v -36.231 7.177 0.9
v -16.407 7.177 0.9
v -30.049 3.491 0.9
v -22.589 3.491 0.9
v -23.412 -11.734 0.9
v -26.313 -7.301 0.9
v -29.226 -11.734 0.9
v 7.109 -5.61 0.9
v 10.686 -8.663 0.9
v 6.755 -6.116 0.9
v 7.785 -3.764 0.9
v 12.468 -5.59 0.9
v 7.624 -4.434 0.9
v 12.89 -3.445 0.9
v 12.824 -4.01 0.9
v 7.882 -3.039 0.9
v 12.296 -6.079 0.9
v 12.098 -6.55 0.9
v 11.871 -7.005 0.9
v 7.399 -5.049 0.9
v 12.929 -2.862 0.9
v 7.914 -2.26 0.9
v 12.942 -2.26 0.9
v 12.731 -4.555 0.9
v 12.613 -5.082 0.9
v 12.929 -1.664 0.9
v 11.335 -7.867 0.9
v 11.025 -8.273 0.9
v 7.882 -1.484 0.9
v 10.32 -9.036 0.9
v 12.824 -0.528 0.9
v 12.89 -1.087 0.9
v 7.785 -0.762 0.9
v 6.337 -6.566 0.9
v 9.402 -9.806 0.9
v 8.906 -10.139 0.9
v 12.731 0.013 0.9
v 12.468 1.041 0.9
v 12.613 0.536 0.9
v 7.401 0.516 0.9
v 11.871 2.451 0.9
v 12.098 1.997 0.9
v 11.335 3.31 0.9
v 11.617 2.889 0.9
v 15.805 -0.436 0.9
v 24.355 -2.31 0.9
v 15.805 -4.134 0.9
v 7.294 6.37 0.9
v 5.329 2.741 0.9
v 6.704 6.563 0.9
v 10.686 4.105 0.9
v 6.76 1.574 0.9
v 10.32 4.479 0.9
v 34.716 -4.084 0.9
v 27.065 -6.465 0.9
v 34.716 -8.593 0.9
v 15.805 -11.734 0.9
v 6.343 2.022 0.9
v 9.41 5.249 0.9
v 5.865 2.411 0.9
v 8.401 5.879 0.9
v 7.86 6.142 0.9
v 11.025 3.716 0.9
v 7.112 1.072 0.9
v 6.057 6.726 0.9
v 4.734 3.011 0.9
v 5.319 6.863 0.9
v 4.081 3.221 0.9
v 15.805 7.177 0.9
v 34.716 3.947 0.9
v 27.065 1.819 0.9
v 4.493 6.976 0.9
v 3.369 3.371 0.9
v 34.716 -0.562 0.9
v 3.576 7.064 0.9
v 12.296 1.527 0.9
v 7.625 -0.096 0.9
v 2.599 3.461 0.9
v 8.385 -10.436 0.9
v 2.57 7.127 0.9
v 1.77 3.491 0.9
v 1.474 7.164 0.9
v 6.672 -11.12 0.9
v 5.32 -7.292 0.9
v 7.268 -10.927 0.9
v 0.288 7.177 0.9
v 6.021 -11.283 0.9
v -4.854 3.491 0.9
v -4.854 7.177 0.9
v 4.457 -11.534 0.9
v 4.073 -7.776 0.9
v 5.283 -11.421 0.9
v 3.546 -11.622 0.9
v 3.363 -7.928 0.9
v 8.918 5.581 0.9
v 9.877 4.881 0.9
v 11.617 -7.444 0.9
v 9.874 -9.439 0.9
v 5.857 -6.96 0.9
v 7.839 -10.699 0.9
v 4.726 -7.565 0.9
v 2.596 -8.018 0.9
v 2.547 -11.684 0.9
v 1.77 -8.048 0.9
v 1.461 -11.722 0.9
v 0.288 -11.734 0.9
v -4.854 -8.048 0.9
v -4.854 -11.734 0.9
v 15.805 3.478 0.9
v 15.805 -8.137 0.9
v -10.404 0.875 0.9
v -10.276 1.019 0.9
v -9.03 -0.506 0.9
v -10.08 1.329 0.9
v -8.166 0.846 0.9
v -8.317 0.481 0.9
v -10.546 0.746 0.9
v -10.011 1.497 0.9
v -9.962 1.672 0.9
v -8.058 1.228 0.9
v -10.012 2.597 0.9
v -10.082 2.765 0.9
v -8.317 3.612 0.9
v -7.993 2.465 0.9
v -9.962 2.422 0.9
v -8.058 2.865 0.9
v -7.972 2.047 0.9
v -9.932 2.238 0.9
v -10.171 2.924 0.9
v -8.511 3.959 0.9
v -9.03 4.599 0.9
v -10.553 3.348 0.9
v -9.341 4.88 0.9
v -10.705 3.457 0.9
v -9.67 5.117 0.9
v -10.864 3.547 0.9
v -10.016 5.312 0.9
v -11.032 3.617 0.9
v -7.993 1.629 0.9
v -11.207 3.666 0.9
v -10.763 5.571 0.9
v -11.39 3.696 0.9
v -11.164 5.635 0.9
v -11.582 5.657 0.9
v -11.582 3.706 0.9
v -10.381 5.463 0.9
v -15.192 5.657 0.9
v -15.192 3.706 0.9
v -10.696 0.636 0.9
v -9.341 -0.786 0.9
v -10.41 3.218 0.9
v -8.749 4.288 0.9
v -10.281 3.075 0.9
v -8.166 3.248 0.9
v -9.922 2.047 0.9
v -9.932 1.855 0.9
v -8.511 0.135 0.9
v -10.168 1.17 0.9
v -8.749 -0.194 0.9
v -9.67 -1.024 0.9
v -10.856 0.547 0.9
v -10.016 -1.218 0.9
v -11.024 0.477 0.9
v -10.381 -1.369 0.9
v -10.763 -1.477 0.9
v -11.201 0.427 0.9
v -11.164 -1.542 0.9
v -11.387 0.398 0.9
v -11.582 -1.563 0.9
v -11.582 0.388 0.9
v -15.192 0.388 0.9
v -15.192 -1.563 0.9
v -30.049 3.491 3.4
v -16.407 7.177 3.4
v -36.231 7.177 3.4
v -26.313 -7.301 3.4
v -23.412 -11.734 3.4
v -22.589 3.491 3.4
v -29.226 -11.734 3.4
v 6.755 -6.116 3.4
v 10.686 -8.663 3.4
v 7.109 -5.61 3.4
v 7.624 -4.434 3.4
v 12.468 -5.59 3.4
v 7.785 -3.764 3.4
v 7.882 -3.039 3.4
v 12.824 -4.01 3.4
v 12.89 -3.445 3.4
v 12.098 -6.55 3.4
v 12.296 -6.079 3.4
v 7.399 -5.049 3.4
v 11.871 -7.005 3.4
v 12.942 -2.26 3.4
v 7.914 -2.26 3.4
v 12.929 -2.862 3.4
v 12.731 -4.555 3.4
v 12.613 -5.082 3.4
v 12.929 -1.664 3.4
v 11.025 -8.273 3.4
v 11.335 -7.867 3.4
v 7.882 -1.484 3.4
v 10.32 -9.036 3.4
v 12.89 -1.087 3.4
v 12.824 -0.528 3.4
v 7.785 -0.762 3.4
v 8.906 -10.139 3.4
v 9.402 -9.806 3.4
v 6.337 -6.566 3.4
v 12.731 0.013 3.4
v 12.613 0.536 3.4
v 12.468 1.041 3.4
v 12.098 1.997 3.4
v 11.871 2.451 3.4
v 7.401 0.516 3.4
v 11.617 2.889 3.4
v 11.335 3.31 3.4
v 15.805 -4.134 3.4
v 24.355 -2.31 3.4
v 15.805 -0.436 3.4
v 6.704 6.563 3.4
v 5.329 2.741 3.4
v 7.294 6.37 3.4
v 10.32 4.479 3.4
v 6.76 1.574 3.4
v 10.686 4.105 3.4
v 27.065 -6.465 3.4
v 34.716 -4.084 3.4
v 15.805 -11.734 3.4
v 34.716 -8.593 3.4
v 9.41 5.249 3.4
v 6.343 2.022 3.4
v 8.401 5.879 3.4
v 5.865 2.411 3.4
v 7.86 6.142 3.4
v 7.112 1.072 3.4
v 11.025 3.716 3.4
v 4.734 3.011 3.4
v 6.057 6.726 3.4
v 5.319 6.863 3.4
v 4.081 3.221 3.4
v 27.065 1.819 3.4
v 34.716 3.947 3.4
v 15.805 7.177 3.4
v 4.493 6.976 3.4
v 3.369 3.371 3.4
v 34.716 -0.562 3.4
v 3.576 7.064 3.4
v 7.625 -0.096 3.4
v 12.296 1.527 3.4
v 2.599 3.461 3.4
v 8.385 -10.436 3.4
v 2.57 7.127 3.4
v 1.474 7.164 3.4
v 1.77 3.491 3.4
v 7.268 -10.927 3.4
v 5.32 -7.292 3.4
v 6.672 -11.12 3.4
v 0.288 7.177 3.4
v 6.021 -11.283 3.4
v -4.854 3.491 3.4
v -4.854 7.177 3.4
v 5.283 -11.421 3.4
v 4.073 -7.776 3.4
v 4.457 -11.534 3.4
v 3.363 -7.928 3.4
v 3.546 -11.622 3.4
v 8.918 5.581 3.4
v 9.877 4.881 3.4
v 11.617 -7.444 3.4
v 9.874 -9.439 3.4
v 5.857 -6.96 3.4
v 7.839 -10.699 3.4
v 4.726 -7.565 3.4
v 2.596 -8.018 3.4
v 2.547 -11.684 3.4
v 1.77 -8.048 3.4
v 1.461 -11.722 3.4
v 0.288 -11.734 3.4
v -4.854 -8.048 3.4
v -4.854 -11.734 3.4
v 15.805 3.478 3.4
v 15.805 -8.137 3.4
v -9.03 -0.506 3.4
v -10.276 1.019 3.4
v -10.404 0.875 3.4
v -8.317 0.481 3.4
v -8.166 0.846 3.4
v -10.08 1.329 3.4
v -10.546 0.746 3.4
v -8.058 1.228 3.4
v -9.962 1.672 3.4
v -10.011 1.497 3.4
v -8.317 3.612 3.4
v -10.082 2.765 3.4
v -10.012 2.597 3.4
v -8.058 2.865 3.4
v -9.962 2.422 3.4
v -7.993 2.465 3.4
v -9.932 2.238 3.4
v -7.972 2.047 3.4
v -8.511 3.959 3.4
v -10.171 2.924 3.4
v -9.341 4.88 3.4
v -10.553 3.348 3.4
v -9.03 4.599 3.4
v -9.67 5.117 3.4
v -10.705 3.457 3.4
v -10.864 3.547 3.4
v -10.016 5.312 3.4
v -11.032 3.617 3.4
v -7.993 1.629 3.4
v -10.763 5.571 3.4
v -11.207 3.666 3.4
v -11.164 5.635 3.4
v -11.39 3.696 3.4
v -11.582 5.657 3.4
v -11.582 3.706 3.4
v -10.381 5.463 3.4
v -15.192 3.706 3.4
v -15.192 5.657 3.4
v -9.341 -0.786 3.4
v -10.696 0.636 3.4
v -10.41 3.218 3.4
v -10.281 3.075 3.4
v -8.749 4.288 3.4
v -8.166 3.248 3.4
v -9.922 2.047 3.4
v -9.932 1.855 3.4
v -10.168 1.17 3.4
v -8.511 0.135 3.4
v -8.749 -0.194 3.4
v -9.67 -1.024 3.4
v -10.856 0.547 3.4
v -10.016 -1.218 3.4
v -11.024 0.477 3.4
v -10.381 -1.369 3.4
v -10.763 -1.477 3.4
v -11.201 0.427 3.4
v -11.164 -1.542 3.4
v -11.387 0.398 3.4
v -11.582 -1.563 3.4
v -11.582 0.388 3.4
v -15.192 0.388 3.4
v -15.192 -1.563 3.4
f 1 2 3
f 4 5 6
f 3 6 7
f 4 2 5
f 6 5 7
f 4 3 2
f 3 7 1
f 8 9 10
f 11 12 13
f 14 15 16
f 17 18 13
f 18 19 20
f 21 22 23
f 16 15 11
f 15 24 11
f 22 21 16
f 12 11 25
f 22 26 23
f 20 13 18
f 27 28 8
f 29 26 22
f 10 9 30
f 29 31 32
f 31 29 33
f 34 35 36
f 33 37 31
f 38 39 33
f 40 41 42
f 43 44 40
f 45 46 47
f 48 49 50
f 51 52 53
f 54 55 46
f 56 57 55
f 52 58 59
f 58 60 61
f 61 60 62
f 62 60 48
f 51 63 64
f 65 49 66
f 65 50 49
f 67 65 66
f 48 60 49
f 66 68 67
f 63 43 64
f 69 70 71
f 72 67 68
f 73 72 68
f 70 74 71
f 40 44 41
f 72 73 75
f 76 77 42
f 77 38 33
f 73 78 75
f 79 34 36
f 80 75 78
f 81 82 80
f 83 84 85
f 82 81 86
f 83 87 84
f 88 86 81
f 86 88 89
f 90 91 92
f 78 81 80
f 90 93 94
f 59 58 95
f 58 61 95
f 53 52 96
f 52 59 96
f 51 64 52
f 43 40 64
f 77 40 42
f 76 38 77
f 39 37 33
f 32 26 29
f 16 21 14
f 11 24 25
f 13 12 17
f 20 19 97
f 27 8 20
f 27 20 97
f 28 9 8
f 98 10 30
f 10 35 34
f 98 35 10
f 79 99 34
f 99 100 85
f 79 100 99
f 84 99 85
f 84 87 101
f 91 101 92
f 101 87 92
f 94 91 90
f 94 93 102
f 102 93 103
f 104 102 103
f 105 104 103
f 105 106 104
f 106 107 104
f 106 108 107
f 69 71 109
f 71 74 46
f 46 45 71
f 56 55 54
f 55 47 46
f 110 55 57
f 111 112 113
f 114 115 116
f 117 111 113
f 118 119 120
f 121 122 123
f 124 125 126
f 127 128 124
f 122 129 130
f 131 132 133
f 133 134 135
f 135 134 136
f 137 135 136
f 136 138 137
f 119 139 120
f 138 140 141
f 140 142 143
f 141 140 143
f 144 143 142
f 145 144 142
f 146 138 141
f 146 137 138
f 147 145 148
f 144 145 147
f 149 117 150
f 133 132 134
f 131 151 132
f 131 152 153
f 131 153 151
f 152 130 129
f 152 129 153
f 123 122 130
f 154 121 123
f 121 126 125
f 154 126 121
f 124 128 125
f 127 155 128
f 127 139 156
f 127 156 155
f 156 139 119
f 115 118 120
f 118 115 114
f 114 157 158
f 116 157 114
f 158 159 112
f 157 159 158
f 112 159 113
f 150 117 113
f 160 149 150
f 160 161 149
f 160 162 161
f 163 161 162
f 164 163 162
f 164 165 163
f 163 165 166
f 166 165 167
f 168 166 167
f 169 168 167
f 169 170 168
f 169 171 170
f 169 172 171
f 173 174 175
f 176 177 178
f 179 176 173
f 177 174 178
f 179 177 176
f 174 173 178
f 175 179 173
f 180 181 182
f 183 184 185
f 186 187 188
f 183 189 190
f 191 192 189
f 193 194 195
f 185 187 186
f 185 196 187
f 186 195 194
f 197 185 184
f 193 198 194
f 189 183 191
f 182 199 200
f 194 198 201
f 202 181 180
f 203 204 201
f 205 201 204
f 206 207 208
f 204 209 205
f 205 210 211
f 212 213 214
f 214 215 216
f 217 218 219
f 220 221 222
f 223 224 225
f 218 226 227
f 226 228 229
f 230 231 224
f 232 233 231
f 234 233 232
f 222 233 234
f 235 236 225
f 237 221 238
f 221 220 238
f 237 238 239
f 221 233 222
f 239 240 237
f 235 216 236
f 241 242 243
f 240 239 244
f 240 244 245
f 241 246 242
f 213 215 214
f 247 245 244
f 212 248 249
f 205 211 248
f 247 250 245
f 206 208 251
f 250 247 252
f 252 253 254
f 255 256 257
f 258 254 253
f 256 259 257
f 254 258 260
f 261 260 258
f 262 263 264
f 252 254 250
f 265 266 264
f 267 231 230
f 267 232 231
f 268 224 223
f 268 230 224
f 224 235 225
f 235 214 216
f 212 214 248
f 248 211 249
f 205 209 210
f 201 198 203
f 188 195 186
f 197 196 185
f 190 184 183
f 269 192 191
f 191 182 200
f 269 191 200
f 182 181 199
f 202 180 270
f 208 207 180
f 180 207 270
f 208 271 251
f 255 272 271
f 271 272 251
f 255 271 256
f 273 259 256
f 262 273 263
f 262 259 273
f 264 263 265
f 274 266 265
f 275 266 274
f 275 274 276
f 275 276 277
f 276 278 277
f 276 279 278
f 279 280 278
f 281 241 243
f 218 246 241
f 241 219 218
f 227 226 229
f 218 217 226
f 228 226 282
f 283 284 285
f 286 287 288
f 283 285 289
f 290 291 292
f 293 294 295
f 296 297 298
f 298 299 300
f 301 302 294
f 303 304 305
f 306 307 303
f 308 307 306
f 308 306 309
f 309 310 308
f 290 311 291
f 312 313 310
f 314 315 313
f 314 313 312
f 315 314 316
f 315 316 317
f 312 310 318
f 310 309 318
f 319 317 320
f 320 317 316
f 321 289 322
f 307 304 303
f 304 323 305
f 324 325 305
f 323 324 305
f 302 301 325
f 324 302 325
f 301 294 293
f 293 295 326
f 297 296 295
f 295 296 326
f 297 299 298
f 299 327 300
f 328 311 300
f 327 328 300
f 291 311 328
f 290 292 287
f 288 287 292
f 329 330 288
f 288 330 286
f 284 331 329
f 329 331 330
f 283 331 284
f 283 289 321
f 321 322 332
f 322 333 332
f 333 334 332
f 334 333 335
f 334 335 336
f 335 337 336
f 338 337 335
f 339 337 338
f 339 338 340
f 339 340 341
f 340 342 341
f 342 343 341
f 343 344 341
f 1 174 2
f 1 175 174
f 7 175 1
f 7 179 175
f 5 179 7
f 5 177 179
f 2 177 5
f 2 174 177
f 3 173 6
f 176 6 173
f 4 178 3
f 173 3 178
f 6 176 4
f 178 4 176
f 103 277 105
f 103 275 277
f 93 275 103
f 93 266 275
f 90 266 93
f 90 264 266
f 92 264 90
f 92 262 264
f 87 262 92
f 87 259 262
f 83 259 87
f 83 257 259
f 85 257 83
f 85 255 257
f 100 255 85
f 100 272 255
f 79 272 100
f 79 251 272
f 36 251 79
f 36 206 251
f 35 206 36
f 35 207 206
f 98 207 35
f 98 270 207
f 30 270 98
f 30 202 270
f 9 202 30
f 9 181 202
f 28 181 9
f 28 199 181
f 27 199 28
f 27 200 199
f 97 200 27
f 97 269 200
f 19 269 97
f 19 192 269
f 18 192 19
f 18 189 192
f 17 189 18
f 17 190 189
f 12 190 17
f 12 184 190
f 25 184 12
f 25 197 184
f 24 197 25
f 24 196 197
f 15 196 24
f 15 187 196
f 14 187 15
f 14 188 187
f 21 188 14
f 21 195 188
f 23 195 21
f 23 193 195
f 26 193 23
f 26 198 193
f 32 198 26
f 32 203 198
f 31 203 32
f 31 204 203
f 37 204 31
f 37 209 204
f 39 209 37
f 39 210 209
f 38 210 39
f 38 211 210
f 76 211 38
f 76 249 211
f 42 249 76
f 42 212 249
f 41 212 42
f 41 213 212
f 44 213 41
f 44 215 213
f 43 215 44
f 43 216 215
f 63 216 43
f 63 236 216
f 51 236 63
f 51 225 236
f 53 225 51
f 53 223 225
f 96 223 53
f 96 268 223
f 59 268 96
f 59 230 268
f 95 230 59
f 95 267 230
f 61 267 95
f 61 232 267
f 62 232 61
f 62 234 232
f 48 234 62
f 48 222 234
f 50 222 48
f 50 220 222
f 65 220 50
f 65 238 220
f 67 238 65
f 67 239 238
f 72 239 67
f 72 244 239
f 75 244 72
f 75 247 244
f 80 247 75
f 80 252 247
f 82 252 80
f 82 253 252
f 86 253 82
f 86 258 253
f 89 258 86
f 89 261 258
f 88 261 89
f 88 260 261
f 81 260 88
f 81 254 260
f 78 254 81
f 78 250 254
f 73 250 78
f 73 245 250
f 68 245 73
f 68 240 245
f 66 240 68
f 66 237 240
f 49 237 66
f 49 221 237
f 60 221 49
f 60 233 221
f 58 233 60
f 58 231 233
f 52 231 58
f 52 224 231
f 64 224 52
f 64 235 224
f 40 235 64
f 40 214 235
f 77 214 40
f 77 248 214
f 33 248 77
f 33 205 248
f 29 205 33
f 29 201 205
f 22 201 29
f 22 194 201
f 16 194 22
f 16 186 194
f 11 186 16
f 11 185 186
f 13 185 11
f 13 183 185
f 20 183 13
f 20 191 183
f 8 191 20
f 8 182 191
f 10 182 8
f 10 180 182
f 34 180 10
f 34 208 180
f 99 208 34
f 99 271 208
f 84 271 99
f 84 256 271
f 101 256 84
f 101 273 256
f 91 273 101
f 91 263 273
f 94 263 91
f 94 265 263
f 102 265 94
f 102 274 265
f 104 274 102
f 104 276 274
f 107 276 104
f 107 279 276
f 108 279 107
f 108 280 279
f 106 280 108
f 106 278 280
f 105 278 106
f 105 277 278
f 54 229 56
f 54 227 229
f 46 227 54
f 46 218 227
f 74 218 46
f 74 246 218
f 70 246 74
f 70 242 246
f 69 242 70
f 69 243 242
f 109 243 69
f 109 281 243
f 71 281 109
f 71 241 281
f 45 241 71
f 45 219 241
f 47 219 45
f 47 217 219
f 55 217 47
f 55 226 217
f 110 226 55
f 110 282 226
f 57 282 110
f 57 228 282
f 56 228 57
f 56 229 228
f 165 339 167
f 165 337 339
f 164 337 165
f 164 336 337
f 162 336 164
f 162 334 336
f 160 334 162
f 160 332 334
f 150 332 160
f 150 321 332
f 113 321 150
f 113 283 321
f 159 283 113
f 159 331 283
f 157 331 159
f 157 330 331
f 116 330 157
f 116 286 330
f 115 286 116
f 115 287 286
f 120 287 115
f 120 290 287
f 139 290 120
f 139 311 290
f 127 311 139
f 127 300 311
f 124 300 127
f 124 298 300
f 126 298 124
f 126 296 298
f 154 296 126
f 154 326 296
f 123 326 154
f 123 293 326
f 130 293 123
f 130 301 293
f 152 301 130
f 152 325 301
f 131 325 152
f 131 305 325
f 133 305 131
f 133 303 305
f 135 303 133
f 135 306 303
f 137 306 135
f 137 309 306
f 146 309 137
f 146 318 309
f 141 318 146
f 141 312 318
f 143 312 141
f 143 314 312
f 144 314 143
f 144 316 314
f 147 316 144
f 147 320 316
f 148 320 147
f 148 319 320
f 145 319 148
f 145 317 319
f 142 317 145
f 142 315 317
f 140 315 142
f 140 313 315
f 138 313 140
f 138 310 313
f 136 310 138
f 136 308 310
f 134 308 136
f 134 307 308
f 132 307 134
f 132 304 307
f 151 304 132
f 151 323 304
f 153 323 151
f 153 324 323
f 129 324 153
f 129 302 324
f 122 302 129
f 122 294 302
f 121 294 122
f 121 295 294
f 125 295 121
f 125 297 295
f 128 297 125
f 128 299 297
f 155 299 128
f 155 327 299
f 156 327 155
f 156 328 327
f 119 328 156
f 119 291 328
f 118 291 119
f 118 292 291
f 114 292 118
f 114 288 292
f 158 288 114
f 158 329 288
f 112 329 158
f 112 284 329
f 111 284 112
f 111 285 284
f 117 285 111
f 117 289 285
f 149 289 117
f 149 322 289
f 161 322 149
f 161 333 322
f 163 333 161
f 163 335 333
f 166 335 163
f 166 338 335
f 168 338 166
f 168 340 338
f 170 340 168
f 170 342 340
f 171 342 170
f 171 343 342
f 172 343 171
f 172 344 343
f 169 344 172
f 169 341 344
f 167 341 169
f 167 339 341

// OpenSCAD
$fn = 48;
  // syllabics (overlaid on icon, tallest)
  translate([0, -2.500, 0.900]) linear_extrude(height=2.500) text("ᐁᐣᑐᕒ", size=18.679, halign="center", valign="center", font="Euphemia UCAS:style=Bold");
